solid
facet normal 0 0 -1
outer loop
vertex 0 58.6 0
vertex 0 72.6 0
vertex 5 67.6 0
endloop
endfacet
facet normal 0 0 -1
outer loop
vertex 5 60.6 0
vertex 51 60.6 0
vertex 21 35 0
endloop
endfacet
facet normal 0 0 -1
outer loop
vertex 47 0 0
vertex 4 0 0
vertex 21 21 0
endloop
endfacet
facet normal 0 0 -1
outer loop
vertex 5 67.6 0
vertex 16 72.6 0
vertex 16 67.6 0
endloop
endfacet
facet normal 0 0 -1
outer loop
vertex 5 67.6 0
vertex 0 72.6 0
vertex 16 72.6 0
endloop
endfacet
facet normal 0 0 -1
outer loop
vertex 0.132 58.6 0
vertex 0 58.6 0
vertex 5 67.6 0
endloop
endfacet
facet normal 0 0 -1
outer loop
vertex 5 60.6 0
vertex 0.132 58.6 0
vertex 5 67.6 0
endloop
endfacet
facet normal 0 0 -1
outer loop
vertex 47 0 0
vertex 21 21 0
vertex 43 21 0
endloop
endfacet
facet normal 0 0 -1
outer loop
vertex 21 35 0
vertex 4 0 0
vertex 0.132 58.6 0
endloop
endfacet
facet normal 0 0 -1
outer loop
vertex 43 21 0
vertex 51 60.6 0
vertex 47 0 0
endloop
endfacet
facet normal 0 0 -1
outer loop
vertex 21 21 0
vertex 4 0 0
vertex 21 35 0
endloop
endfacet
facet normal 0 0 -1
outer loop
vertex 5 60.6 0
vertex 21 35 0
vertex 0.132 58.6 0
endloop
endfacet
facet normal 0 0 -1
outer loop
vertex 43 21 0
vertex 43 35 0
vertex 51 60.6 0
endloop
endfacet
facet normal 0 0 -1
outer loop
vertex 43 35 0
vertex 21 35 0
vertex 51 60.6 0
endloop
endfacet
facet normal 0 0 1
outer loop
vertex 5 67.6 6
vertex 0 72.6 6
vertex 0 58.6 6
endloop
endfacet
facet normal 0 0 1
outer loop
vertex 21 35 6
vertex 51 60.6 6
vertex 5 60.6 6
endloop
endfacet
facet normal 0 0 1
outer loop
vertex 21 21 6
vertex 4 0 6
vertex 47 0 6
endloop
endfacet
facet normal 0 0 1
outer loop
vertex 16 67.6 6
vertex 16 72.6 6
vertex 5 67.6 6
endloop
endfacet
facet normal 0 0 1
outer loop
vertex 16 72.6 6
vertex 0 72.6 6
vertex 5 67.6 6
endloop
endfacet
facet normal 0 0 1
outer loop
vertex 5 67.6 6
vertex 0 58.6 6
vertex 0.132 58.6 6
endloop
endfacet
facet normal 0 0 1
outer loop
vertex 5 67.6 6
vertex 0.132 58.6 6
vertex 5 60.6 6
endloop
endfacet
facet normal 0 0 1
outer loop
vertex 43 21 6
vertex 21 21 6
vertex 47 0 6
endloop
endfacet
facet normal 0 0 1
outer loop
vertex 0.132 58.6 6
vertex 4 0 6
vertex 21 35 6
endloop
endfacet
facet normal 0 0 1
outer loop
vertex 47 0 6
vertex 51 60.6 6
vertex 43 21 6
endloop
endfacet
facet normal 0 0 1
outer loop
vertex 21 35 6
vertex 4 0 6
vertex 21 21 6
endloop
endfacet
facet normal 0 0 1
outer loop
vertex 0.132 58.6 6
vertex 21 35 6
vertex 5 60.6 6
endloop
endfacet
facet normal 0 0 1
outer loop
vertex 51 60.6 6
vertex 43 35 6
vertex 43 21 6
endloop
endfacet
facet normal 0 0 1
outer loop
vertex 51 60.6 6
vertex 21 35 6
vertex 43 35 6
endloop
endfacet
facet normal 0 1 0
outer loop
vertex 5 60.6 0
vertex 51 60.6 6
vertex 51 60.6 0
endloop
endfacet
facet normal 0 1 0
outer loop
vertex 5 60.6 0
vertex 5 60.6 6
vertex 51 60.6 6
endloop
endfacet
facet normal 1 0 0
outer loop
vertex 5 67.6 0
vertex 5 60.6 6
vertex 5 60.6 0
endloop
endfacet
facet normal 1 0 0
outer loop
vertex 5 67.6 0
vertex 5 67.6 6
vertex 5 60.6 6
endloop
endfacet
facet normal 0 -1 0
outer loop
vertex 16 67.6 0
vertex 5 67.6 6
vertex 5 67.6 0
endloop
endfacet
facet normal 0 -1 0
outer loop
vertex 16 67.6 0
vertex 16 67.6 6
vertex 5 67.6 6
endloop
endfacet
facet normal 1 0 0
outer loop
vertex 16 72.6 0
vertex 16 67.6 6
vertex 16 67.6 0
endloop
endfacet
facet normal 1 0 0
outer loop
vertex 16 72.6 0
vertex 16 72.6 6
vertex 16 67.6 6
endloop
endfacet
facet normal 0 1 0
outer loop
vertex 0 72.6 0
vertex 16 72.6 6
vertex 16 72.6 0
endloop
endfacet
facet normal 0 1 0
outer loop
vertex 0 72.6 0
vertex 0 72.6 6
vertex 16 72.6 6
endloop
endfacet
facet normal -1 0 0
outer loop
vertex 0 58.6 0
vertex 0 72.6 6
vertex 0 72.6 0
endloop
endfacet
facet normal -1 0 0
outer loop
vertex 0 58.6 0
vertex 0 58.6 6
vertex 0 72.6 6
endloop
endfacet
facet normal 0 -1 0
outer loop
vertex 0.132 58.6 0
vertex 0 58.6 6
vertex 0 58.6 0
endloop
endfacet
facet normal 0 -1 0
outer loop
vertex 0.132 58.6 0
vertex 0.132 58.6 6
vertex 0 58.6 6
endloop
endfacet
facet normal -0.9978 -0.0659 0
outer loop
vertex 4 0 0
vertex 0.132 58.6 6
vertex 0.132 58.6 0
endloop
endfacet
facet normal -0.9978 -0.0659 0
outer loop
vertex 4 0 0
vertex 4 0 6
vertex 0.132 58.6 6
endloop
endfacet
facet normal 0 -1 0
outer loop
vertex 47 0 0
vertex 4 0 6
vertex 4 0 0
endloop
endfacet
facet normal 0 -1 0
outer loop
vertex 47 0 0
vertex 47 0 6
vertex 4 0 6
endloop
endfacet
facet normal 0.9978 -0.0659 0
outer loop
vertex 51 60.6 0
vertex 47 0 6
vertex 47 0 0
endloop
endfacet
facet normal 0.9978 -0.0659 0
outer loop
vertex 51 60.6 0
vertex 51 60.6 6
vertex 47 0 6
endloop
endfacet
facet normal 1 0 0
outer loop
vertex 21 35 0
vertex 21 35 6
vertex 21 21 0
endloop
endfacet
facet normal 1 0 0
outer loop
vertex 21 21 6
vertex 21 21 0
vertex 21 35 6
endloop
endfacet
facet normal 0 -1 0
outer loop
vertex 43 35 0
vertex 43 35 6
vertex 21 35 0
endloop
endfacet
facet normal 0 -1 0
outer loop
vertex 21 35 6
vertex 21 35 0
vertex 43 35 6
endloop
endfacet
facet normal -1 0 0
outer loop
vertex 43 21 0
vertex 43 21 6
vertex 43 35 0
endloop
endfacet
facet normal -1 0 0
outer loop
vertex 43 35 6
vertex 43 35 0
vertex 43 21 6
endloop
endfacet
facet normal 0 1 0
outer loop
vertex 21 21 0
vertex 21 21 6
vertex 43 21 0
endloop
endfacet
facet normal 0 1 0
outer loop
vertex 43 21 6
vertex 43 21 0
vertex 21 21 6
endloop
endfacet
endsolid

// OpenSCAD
// Generated plate-clip profile. Units are millimetres.
// This is a mesh preview. A STEP solid needs CadQuery or build123d.
linear_extrude(height=6.0000, convexity=4)
  difference() {
    polygon(points=[[47.0000, 0.0000], [4.0000, 0.0000], [0.1320, 58.6000], [0.0000, 58.6000], [0.0000, 60.6000], [0.0000, 72.6000], [16.0000, 72.6000], [16.0000, 67.6000], [5.0000, 67.6000], [5.0000, 60.6000], [16.0000, 60.6000], [51.0000, 60.6000]]);
    polygon(points=[[43.0000, 35.0000], [21.0000, 35.0000], [21.0000, 21.0000], [43.0000, 21.0000]]);
  }
